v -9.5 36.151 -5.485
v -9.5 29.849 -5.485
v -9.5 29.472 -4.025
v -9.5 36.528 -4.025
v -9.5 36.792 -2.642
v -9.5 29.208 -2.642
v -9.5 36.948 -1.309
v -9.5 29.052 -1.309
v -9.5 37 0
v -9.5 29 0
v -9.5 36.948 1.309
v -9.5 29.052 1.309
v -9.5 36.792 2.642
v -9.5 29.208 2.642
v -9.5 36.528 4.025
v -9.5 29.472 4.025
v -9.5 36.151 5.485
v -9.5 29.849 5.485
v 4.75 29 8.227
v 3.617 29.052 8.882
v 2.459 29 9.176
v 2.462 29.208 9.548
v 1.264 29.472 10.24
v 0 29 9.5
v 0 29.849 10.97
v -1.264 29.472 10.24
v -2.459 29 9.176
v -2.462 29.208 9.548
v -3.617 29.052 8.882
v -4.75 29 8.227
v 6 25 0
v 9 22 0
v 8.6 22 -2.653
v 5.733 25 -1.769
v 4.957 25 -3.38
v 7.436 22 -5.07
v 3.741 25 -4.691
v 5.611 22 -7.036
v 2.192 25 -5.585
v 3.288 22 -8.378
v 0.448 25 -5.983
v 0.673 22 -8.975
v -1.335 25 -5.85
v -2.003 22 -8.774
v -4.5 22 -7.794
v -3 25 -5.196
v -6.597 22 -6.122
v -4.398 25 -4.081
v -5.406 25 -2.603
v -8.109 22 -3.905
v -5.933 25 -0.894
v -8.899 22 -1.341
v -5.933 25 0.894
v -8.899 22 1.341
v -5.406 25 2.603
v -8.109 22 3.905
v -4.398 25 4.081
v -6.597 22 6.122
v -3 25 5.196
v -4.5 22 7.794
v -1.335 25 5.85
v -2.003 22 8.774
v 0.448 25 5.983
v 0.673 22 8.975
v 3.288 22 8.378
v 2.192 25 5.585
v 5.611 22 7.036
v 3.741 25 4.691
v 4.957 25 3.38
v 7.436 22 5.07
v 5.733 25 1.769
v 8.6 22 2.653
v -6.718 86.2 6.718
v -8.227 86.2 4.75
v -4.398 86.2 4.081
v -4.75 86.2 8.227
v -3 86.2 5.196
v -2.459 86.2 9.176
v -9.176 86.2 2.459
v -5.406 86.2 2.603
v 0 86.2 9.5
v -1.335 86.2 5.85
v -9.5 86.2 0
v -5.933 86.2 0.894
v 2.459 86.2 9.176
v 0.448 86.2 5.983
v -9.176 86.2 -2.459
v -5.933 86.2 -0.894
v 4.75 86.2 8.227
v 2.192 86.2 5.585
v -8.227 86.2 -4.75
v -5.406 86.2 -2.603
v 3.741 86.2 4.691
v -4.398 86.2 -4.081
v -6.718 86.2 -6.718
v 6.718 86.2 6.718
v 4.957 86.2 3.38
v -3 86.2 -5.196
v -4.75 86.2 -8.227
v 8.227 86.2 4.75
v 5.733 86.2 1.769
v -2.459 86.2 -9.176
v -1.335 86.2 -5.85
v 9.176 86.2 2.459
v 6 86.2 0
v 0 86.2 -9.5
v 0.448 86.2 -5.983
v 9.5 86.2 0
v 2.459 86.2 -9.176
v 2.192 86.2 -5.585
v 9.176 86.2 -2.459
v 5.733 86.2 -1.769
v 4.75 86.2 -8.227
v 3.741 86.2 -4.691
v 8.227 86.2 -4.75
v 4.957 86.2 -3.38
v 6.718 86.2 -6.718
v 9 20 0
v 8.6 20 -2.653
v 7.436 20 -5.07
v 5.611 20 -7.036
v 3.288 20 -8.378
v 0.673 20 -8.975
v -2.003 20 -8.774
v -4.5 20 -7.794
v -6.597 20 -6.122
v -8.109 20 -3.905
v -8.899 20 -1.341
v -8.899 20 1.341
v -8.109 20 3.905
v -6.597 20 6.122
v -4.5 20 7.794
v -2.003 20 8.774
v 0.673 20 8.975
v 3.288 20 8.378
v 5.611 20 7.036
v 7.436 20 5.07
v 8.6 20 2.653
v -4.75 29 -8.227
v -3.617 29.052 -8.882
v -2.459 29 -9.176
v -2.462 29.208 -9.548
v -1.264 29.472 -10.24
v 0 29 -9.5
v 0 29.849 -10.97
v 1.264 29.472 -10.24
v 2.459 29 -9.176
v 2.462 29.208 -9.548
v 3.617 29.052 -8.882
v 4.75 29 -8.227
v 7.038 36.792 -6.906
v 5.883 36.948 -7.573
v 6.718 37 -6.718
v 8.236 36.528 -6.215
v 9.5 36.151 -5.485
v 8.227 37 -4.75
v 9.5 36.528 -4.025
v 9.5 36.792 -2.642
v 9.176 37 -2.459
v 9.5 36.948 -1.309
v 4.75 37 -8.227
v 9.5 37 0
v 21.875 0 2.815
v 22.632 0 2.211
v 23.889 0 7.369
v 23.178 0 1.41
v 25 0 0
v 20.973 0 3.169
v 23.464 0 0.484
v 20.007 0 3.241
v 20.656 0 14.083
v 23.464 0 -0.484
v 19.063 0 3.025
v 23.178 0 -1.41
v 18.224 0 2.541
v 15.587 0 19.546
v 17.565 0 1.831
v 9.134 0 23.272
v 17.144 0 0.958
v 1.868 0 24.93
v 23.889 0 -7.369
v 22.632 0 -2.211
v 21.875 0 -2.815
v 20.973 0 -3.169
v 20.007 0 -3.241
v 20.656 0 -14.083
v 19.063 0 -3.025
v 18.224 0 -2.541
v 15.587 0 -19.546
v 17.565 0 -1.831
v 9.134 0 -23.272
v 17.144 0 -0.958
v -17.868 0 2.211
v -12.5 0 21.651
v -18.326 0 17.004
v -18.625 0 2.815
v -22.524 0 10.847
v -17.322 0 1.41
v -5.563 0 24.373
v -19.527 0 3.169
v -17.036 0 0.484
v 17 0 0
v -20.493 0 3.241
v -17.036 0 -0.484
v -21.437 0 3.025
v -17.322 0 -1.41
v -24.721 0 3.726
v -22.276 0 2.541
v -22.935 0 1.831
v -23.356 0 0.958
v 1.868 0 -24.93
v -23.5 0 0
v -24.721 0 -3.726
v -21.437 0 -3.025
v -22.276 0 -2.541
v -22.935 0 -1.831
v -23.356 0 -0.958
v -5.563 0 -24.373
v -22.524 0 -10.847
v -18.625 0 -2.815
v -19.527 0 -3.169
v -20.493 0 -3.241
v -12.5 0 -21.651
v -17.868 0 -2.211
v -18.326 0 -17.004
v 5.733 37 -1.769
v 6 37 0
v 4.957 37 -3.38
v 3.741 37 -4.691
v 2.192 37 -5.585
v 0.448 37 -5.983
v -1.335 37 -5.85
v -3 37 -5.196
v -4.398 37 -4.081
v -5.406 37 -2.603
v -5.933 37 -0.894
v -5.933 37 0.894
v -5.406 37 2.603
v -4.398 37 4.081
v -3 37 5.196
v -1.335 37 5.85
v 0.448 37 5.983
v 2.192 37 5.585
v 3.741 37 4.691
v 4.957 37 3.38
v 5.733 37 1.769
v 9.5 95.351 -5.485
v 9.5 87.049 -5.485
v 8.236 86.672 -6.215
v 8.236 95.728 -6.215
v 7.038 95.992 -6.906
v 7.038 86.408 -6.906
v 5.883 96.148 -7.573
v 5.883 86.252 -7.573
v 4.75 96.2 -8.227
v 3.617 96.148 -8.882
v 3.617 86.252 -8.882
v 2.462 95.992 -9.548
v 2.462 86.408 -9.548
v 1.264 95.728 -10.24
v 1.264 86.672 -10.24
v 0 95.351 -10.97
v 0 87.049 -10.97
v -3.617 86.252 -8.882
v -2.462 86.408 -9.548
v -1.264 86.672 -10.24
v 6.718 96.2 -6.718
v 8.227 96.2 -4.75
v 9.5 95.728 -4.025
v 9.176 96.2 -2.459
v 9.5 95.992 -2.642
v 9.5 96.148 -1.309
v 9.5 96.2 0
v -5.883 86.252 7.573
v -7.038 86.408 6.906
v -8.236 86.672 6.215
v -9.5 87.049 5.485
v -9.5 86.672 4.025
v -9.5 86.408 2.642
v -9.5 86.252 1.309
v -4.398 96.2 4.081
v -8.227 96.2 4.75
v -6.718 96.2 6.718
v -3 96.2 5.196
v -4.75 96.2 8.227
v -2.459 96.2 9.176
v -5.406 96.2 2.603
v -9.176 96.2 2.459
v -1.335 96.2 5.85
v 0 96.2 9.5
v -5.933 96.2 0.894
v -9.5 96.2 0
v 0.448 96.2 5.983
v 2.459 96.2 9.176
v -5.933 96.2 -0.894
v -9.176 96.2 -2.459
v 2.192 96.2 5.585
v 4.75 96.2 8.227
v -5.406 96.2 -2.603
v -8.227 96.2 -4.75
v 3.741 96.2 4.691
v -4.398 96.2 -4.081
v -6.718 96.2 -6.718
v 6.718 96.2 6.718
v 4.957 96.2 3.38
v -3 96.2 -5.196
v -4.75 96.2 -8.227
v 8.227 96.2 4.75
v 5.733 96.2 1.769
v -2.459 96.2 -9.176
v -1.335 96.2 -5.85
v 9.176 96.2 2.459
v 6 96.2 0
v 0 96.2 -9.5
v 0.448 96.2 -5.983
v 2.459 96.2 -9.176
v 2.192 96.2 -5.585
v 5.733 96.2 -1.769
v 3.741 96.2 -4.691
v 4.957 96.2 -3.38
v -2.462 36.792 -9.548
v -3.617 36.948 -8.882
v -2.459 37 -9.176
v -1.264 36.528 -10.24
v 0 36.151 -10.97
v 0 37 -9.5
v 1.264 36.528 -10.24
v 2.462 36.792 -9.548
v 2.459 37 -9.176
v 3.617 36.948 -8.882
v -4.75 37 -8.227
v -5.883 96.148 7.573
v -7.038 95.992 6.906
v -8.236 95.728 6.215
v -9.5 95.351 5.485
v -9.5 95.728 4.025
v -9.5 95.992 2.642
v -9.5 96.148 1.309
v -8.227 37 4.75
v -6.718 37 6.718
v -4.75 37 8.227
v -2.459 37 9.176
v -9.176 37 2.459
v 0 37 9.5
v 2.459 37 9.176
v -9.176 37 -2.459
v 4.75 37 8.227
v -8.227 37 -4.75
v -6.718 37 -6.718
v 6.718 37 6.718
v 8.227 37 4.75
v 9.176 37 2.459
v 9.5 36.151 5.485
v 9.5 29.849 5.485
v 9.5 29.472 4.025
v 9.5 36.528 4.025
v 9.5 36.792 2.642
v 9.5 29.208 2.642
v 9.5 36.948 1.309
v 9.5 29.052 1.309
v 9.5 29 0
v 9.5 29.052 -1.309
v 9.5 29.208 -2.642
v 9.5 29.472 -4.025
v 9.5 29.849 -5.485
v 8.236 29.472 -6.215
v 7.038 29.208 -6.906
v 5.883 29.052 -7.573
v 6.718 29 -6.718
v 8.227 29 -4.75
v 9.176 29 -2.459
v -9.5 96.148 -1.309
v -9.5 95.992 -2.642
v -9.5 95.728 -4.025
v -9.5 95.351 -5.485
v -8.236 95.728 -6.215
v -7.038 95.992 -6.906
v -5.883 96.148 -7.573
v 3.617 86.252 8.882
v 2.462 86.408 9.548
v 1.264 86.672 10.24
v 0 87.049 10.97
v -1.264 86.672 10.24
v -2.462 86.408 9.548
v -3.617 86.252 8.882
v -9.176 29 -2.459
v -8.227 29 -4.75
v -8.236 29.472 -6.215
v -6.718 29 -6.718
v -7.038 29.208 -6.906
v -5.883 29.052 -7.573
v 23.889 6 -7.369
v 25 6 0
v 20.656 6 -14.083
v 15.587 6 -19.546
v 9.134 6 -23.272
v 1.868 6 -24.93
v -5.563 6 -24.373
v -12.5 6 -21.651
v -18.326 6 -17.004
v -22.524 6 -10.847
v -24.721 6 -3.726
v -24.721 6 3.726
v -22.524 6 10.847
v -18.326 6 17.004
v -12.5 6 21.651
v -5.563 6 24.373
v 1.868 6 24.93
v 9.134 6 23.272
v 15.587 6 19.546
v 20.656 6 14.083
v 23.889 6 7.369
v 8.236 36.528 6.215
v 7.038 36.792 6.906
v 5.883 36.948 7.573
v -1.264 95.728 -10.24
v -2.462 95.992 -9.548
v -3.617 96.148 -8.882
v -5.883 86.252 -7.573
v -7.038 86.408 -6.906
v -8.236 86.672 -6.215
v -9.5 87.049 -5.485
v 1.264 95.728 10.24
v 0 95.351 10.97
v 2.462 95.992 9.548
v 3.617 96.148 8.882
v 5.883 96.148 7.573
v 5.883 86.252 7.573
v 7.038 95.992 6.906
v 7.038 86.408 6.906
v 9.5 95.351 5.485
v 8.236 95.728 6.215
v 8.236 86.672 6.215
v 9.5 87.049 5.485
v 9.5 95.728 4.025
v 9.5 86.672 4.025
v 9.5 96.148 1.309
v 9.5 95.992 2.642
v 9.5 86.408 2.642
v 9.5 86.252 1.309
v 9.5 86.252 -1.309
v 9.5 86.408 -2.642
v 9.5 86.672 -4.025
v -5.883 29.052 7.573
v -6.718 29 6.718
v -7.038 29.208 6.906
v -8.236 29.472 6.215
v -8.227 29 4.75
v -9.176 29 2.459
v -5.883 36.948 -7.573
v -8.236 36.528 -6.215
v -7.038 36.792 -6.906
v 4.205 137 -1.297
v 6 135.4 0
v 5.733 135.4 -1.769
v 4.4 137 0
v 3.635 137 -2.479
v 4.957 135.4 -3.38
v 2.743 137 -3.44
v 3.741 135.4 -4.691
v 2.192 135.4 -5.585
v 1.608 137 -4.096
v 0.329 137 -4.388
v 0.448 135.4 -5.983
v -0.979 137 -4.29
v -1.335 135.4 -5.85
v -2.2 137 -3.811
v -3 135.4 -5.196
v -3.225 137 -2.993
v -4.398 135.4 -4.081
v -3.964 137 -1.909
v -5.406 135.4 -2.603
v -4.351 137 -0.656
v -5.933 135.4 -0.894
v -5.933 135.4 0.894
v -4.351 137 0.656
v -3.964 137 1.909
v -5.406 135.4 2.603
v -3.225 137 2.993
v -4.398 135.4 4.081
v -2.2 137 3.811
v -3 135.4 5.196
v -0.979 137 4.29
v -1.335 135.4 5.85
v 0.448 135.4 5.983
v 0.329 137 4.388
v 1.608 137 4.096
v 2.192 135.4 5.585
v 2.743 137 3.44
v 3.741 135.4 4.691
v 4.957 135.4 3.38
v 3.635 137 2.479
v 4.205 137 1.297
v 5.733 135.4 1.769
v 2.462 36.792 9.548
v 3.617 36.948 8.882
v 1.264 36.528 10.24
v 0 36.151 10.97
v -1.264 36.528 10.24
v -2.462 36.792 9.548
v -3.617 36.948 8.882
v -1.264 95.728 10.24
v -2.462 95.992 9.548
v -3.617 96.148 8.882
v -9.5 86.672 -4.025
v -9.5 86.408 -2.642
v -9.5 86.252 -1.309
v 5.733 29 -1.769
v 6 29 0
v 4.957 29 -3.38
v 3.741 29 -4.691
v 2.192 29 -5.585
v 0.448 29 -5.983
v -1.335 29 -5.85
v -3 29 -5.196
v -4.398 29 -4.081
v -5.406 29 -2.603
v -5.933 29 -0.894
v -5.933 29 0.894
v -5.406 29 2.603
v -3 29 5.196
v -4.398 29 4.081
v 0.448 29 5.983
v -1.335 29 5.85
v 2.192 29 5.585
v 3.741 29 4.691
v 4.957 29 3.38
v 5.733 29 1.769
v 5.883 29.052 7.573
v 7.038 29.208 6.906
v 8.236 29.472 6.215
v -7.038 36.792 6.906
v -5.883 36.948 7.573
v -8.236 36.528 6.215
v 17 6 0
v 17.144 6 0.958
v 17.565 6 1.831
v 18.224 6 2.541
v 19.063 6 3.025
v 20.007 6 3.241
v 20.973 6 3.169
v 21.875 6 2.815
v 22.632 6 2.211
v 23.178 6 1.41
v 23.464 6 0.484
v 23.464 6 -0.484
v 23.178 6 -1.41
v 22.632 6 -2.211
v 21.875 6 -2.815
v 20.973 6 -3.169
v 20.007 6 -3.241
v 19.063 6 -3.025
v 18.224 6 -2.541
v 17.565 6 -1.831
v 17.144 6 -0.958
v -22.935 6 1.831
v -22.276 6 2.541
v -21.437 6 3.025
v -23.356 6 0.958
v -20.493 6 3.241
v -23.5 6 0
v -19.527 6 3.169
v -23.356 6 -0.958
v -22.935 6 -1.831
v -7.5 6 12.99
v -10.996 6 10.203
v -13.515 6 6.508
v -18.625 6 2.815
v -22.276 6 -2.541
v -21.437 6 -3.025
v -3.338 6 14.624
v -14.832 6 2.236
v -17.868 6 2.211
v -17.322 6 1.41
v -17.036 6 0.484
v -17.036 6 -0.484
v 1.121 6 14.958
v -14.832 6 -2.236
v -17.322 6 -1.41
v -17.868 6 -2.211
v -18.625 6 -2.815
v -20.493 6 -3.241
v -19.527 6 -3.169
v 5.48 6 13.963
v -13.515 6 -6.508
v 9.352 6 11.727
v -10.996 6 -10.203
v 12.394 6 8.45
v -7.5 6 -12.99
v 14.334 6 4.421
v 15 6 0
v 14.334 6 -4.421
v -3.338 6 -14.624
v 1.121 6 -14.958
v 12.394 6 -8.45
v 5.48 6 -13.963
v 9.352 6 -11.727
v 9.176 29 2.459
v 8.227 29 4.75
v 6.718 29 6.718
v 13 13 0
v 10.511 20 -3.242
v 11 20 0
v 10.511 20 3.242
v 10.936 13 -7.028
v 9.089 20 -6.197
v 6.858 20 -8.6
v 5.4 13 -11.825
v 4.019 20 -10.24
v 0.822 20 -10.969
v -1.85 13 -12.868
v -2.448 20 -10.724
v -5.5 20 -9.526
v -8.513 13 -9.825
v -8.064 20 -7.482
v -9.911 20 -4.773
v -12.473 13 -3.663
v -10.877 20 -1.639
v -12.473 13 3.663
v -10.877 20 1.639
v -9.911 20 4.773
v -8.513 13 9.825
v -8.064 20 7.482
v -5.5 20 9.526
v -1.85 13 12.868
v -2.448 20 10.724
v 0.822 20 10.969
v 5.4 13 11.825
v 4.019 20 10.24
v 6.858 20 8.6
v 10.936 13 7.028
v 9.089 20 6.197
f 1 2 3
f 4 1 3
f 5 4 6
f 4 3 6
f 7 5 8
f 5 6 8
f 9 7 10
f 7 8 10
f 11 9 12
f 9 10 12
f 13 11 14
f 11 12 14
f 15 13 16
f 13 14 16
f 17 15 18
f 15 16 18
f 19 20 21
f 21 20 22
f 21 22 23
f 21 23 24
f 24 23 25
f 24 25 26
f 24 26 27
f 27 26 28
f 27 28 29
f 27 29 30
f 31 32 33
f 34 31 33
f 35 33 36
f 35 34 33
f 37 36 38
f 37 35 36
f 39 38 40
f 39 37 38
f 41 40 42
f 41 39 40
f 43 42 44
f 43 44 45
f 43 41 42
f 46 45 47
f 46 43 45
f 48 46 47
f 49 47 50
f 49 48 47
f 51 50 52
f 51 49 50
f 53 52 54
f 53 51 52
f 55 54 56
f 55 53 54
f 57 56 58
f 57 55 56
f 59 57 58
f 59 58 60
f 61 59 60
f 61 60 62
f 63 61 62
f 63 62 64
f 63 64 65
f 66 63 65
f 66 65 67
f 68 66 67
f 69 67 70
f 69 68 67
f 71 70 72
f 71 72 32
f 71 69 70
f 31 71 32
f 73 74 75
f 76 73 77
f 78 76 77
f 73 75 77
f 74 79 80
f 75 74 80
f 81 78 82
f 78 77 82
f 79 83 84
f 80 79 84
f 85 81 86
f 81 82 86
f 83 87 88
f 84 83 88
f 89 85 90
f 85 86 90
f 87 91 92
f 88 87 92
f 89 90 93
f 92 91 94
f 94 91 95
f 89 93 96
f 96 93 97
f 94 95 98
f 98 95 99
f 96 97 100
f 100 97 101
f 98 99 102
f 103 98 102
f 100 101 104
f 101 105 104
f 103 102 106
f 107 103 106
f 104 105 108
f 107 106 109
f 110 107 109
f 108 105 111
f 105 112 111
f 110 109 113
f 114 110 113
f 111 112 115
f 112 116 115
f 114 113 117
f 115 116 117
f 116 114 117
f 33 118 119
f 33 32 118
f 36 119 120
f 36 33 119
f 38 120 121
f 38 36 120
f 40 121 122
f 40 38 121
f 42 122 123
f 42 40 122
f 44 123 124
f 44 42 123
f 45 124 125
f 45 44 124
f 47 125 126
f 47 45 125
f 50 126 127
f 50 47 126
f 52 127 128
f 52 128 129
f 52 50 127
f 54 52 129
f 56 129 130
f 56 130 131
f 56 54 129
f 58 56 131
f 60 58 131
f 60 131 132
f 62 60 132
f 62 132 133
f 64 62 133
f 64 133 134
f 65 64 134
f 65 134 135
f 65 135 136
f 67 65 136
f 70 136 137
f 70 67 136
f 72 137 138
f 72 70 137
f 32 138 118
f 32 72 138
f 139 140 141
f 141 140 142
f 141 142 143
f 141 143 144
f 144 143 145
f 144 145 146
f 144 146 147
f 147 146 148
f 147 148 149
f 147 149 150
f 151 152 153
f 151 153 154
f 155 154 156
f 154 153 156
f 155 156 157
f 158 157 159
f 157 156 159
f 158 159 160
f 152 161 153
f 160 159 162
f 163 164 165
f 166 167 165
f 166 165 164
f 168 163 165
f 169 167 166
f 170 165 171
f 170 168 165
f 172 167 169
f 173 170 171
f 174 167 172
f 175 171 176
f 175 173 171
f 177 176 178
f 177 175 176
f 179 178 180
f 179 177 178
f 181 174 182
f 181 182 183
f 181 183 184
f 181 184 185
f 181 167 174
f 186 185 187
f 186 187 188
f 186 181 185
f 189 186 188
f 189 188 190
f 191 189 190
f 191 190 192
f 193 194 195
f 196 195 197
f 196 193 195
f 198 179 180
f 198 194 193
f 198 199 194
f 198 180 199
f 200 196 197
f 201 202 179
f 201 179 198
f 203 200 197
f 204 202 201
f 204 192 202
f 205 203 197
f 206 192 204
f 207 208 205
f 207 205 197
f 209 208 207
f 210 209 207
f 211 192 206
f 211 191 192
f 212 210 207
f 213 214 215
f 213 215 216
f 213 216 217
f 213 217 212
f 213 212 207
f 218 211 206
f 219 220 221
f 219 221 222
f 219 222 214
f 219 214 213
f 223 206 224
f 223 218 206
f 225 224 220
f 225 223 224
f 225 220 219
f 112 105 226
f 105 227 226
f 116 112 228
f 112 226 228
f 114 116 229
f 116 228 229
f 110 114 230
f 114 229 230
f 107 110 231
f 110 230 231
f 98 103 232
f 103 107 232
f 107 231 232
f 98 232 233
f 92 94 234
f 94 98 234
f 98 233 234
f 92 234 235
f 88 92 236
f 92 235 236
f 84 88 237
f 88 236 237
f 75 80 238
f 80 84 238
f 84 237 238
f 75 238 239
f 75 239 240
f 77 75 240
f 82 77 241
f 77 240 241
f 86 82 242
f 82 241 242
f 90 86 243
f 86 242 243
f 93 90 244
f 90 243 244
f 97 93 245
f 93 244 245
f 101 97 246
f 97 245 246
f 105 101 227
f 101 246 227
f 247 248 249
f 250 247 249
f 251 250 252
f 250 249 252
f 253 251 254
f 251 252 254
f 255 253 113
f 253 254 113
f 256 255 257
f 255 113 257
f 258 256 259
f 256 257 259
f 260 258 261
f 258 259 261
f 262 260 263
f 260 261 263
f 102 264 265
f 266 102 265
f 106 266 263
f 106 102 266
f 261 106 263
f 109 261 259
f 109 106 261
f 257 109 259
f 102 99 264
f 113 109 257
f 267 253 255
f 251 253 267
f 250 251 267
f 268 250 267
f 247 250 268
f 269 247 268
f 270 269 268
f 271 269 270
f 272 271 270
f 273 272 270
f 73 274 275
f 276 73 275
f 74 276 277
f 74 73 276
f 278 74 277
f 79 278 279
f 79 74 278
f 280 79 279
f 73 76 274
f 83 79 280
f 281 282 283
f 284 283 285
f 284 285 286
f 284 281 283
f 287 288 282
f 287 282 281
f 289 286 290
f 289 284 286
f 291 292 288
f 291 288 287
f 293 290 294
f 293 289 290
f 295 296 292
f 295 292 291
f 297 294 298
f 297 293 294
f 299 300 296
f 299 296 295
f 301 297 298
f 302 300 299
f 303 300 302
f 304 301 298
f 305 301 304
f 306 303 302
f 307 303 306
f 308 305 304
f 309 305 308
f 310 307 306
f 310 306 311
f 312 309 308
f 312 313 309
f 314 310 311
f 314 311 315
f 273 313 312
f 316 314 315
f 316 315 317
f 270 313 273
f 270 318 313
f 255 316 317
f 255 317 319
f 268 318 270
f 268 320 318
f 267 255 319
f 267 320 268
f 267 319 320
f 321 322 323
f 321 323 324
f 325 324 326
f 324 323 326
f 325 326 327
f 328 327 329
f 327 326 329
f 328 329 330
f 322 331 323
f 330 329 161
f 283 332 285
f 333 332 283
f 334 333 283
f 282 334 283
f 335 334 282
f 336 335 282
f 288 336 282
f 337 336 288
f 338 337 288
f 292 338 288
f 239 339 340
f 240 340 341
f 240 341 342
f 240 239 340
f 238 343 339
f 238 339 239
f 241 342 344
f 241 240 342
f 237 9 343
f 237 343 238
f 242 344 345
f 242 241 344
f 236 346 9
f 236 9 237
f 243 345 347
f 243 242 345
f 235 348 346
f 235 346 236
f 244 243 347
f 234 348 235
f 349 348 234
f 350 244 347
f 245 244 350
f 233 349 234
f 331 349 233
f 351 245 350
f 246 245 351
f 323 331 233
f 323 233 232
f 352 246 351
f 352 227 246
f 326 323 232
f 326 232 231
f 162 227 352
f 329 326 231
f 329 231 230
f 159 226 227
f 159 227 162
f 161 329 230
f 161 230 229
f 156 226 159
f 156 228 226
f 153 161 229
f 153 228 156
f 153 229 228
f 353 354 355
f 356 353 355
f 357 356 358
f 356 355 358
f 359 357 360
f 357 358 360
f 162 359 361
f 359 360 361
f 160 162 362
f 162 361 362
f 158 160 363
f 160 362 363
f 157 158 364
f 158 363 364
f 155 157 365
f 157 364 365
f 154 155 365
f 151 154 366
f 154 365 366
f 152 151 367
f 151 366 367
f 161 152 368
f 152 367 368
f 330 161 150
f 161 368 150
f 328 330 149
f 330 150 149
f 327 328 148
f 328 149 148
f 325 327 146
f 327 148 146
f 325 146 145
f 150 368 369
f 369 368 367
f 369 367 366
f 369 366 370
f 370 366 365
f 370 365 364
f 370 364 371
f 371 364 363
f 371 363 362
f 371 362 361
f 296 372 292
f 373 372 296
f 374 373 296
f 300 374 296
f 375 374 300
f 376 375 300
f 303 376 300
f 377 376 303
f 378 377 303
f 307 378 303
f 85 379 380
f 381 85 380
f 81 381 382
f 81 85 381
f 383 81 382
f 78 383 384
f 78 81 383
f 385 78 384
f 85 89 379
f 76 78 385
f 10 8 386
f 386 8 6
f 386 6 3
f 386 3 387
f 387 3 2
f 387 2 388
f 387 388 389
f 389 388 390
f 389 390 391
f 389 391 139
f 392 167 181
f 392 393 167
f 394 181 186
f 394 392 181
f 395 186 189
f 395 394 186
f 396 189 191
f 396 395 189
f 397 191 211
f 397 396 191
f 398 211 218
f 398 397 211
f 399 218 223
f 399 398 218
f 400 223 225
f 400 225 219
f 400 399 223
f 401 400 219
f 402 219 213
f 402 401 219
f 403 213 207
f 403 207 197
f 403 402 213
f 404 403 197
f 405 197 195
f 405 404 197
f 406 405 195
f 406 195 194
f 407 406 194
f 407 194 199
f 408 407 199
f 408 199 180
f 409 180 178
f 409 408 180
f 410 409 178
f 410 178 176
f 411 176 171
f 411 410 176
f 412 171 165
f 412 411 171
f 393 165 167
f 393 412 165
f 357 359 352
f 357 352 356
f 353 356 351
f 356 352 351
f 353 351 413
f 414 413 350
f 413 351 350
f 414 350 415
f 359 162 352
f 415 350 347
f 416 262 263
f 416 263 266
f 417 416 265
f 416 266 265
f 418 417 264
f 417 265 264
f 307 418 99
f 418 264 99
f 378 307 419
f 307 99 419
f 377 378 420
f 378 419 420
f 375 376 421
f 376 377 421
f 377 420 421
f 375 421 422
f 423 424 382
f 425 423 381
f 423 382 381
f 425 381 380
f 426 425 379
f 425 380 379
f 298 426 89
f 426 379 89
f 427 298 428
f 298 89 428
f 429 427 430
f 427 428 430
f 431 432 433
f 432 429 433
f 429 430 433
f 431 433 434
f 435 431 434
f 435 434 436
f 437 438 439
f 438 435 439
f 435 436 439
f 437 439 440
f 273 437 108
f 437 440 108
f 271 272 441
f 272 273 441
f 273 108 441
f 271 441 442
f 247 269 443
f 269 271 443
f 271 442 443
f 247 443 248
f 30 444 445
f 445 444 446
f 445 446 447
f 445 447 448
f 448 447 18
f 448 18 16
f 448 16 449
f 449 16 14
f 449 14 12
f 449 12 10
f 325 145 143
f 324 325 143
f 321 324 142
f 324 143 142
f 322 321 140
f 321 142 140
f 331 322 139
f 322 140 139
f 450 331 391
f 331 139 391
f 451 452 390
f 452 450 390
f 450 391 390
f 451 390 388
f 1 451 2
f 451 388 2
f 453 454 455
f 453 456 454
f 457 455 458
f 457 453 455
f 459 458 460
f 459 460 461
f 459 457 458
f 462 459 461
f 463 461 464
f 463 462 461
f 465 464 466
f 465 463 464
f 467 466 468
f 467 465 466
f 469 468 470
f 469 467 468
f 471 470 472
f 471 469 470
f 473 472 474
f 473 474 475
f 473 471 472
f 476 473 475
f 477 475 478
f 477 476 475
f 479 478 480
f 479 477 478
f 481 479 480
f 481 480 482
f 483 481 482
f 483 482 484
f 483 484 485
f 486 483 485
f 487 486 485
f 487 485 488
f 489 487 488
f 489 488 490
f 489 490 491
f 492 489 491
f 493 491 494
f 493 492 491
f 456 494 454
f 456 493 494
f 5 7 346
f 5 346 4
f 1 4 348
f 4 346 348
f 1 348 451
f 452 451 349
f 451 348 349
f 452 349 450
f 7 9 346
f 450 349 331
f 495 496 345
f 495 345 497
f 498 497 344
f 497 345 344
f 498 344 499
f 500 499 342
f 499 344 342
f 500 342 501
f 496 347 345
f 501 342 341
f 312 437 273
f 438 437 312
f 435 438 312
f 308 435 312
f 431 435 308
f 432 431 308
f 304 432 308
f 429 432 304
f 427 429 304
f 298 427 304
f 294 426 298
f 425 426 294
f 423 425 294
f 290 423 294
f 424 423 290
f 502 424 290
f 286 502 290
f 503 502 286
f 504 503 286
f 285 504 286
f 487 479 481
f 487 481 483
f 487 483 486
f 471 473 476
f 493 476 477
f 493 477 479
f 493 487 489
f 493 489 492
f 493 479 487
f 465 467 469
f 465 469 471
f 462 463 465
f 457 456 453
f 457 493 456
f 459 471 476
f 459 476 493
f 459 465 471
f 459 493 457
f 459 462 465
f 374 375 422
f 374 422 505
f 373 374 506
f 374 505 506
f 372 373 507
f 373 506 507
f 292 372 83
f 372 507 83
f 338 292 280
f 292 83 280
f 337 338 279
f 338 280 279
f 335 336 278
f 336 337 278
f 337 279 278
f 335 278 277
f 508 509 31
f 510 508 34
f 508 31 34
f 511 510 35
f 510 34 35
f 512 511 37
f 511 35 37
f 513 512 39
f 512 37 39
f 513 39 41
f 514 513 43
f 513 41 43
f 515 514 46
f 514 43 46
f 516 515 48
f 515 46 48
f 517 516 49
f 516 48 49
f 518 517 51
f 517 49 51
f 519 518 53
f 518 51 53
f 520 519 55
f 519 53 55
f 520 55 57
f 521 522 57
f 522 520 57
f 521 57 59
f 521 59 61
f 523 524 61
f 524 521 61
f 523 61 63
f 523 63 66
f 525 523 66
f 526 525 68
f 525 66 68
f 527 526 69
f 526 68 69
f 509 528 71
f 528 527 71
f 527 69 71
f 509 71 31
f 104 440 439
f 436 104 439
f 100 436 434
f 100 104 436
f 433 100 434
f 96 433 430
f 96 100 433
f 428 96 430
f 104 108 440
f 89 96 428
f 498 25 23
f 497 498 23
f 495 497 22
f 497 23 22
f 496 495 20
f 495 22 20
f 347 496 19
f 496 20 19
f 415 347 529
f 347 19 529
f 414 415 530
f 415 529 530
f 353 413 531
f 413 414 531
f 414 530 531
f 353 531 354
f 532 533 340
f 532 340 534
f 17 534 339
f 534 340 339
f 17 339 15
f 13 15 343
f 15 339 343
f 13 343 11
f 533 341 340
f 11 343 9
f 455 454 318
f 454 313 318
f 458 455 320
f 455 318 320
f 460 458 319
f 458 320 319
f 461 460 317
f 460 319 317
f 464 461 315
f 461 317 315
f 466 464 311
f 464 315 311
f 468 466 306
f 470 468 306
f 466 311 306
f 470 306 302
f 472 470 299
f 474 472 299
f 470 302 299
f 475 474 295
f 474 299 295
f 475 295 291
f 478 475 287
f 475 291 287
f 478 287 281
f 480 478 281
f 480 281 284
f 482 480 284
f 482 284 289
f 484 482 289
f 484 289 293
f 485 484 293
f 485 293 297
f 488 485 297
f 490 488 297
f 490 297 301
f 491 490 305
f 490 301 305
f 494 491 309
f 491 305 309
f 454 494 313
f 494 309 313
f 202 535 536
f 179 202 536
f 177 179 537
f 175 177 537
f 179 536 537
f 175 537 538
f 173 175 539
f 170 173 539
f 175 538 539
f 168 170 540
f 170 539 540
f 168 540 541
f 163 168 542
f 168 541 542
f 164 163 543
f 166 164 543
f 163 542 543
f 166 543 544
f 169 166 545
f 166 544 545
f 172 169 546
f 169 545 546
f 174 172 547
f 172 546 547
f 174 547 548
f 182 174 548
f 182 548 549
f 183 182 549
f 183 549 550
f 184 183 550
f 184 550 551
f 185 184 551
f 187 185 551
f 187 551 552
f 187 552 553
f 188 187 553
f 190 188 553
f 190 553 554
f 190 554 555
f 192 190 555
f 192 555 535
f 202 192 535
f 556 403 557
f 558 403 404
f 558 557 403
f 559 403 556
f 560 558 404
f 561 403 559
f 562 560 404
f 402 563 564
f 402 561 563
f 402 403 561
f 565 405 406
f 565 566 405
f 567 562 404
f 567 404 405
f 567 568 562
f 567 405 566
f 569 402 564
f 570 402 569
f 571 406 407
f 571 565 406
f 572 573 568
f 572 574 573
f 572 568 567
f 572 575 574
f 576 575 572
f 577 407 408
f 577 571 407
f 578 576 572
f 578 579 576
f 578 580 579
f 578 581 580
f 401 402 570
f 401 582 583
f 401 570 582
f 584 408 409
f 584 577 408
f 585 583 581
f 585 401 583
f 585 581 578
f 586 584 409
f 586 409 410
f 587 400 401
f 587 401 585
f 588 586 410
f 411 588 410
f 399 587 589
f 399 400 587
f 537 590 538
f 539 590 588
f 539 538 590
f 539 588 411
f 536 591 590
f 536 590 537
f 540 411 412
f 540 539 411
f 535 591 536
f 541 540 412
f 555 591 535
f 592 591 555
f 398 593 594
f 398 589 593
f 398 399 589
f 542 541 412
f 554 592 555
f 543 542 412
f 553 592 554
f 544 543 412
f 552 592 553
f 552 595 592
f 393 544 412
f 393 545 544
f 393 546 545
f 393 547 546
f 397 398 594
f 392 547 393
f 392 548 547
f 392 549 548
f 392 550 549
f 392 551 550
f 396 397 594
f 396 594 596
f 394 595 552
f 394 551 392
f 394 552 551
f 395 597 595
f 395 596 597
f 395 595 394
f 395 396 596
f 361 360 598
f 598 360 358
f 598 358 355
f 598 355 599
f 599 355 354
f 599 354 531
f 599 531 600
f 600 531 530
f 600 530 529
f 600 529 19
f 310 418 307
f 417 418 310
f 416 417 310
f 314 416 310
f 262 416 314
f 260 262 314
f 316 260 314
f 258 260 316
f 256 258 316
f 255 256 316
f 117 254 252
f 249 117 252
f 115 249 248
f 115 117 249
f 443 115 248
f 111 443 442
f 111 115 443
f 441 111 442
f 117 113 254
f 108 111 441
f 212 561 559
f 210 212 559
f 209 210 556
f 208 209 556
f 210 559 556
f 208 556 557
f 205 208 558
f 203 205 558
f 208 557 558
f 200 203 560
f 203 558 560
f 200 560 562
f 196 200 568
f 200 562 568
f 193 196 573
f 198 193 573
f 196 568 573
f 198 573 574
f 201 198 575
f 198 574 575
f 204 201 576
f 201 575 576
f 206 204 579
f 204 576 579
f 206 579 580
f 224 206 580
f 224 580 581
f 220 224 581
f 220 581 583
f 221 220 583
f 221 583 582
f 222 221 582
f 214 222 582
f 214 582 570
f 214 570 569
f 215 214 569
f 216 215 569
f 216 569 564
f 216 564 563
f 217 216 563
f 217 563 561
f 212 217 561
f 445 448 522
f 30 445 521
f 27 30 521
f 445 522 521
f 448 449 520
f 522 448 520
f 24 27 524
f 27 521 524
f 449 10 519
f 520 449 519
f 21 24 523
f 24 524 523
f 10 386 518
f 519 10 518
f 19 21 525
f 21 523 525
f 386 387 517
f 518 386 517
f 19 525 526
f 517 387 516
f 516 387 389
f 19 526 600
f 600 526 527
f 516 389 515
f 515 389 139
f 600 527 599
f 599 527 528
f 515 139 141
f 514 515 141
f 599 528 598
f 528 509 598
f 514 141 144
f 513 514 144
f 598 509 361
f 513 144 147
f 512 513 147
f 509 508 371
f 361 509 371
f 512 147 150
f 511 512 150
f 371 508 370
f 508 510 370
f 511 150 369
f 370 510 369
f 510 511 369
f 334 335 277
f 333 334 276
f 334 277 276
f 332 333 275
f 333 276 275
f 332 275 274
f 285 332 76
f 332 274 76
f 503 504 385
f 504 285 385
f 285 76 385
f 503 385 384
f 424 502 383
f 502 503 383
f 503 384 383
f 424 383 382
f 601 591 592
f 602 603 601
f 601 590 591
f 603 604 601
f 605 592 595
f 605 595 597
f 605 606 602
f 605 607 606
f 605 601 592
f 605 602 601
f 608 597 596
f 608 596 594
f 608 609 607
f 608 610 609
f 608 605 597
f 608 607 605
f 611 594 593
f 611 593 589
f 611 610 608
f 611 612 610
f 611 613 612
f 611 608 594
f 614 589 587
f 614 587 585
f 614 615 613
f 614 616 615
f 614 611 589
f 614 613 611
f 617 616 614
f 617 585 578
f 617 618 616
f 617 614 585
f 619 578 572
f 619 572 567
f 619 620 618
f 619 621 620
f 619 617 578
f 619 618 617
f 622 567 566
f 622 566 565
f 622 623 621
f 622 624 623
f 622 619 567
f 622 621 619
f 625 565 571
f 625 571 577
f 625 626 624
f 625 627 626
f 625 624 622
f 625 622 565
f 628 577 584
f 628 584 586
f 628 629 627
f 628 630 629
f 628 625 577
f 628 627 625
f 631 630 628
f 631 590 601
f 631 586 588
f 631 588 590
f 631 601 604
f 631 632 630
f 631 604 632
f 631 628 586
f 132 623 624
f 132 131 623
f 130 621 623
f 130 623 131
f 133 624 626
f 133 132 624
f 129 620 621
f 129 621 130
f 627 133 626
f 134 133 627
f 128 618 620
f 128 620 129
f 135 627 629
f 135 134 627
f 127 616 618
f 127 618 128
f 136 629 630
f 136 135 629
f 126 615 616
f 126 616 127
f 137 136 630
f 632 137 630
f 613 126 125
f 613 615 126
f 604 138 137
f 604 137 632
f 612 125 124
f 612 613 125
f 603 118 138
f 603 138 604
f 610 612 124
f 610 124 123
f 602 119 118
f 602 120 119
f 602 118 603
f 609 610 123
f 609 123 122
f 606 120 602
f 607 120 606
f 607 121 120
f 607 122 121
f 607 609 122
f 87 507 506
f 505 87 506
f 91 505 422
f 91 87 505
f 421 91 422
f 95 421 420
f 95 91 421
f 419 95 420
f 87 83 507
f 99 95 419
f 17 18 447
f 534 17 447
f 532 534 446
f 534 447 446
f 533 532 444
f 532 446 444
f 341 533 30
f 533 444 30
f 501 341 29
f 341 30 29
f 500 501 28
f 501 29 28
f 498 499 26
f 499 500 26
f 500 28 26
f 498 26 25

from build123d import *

# Parameters (mm, degrees)
EXTRUDE_1_DEPTH     = 8
EXTRUDE_2_DEPTH     = 10
SKETCH_5_R          = 3.25
CUT_EXTRUDE_1_DEPTH = 7


with BuildPart() as part:
    # Эскиз1 → Повернуть1 (revolve)
    with BuildSketch(Plane.XY, mode=Mode.PRIVATE) as revolve_1_sk:
        Polygon((0, 0), (-25, 0), (-25, 6), (-15, 6), (-11, 20), (-9, 20), (-9, 22), (-6, 25), (-6, 29), (-6, 37), (-6, 135.4), (-4.4, 137), (0, 137), align=None)
    revolve(revolve_1_sk.sketch.rotate(Axis((0, 0, 0), (0, 1, 0)), 180), axis=Axis((0, 0, 0), (0, 1, 0)))  # turned: the seam where the file's is

    # Эскиз2 → Бобышка-Вытянуть1 (add)
    with BuildSketch(Plane(origin=(0, 29, 0), x_dir=(1, 0, 0), z_dir=(0, 1, 0))):
        Polygon((0, 10.969655115), (-9.5, 5.484827557), (-9.5, -5.484827557), (0, -10.969655115), (9.5, -5.484827557), (9.5, 5.484827557), align=None)
    extrude(amount=EXTRUDE_1_DEPTH)

    # Эскиз3 → Бобышка-Вытянуть2 (add)
    with BuildSketch(Plane(origin=(0, 86.2, 0), x_dir=(1, 0, 0), z_dir=(0, 1, 0))):
        Polygon((9.5, 5.484827557), (0, 10.969655115), (-9.5, 5.484827557), (-9.5, -5.484827557), (0, -10.969655115), (9.5, -5.484827557), align=None)
    extrude(amount=EXTRUDE_2_DEPTH)

    # Эскиз4 → Вырез-Повернуть2 (revolve, cut)
    with BuildSketch(Plane.XY, mode=Mode.PRIVATE) as cut_revolve_2_sk:
        Polygon((-18.160254038, 96.2), (-9.5, 96.2), (-18.160254038, 91.2), align=None)
        Polygon((-18.160254038, 86.2), (-18.160254038, 91.2), (-9.5, 86.2), align=None)
        Polygon((-16.42820323, 37), (-16.42820323, 33), (-9.5, 37), align=None)
        Polygon((-16.42820323, 33), (-16.42820323, 29), (-9.5, 29), align=None)
    revolve(cut_revolve_2_sk.sketch.rotate(Axis((0, 137, 0), (0, -1, 0)), 180), axis=Axis((0, 137, 0), (0, -1, 0)), mode=Mode.SUBTRACT)  # turned: the seam where the file's is

    # Эскиз5 → Вырез-Вытянуть1 (cut, through all)
    with BuildSketch(Plane(origin=(0, 6, 0), x_dir=(1, 0, 0), z_dir=(0, 1, 0))):
        with Locations(Location((-20.25, 0, 0), (0, 0, 180))):  # turned: the seam where the file's is
            Circle(SKETCH_5_R)
        with Locations(Location((20.25, 0, 0), (0, 0, 180))):  # turned: the seam where the file's is
            Circle(SKETCH_5_R)
    extrude(amount=-CUT_EXTRUDE_1_DEPTH, mode=Mode.SUBTRACT)


solid = part.part
